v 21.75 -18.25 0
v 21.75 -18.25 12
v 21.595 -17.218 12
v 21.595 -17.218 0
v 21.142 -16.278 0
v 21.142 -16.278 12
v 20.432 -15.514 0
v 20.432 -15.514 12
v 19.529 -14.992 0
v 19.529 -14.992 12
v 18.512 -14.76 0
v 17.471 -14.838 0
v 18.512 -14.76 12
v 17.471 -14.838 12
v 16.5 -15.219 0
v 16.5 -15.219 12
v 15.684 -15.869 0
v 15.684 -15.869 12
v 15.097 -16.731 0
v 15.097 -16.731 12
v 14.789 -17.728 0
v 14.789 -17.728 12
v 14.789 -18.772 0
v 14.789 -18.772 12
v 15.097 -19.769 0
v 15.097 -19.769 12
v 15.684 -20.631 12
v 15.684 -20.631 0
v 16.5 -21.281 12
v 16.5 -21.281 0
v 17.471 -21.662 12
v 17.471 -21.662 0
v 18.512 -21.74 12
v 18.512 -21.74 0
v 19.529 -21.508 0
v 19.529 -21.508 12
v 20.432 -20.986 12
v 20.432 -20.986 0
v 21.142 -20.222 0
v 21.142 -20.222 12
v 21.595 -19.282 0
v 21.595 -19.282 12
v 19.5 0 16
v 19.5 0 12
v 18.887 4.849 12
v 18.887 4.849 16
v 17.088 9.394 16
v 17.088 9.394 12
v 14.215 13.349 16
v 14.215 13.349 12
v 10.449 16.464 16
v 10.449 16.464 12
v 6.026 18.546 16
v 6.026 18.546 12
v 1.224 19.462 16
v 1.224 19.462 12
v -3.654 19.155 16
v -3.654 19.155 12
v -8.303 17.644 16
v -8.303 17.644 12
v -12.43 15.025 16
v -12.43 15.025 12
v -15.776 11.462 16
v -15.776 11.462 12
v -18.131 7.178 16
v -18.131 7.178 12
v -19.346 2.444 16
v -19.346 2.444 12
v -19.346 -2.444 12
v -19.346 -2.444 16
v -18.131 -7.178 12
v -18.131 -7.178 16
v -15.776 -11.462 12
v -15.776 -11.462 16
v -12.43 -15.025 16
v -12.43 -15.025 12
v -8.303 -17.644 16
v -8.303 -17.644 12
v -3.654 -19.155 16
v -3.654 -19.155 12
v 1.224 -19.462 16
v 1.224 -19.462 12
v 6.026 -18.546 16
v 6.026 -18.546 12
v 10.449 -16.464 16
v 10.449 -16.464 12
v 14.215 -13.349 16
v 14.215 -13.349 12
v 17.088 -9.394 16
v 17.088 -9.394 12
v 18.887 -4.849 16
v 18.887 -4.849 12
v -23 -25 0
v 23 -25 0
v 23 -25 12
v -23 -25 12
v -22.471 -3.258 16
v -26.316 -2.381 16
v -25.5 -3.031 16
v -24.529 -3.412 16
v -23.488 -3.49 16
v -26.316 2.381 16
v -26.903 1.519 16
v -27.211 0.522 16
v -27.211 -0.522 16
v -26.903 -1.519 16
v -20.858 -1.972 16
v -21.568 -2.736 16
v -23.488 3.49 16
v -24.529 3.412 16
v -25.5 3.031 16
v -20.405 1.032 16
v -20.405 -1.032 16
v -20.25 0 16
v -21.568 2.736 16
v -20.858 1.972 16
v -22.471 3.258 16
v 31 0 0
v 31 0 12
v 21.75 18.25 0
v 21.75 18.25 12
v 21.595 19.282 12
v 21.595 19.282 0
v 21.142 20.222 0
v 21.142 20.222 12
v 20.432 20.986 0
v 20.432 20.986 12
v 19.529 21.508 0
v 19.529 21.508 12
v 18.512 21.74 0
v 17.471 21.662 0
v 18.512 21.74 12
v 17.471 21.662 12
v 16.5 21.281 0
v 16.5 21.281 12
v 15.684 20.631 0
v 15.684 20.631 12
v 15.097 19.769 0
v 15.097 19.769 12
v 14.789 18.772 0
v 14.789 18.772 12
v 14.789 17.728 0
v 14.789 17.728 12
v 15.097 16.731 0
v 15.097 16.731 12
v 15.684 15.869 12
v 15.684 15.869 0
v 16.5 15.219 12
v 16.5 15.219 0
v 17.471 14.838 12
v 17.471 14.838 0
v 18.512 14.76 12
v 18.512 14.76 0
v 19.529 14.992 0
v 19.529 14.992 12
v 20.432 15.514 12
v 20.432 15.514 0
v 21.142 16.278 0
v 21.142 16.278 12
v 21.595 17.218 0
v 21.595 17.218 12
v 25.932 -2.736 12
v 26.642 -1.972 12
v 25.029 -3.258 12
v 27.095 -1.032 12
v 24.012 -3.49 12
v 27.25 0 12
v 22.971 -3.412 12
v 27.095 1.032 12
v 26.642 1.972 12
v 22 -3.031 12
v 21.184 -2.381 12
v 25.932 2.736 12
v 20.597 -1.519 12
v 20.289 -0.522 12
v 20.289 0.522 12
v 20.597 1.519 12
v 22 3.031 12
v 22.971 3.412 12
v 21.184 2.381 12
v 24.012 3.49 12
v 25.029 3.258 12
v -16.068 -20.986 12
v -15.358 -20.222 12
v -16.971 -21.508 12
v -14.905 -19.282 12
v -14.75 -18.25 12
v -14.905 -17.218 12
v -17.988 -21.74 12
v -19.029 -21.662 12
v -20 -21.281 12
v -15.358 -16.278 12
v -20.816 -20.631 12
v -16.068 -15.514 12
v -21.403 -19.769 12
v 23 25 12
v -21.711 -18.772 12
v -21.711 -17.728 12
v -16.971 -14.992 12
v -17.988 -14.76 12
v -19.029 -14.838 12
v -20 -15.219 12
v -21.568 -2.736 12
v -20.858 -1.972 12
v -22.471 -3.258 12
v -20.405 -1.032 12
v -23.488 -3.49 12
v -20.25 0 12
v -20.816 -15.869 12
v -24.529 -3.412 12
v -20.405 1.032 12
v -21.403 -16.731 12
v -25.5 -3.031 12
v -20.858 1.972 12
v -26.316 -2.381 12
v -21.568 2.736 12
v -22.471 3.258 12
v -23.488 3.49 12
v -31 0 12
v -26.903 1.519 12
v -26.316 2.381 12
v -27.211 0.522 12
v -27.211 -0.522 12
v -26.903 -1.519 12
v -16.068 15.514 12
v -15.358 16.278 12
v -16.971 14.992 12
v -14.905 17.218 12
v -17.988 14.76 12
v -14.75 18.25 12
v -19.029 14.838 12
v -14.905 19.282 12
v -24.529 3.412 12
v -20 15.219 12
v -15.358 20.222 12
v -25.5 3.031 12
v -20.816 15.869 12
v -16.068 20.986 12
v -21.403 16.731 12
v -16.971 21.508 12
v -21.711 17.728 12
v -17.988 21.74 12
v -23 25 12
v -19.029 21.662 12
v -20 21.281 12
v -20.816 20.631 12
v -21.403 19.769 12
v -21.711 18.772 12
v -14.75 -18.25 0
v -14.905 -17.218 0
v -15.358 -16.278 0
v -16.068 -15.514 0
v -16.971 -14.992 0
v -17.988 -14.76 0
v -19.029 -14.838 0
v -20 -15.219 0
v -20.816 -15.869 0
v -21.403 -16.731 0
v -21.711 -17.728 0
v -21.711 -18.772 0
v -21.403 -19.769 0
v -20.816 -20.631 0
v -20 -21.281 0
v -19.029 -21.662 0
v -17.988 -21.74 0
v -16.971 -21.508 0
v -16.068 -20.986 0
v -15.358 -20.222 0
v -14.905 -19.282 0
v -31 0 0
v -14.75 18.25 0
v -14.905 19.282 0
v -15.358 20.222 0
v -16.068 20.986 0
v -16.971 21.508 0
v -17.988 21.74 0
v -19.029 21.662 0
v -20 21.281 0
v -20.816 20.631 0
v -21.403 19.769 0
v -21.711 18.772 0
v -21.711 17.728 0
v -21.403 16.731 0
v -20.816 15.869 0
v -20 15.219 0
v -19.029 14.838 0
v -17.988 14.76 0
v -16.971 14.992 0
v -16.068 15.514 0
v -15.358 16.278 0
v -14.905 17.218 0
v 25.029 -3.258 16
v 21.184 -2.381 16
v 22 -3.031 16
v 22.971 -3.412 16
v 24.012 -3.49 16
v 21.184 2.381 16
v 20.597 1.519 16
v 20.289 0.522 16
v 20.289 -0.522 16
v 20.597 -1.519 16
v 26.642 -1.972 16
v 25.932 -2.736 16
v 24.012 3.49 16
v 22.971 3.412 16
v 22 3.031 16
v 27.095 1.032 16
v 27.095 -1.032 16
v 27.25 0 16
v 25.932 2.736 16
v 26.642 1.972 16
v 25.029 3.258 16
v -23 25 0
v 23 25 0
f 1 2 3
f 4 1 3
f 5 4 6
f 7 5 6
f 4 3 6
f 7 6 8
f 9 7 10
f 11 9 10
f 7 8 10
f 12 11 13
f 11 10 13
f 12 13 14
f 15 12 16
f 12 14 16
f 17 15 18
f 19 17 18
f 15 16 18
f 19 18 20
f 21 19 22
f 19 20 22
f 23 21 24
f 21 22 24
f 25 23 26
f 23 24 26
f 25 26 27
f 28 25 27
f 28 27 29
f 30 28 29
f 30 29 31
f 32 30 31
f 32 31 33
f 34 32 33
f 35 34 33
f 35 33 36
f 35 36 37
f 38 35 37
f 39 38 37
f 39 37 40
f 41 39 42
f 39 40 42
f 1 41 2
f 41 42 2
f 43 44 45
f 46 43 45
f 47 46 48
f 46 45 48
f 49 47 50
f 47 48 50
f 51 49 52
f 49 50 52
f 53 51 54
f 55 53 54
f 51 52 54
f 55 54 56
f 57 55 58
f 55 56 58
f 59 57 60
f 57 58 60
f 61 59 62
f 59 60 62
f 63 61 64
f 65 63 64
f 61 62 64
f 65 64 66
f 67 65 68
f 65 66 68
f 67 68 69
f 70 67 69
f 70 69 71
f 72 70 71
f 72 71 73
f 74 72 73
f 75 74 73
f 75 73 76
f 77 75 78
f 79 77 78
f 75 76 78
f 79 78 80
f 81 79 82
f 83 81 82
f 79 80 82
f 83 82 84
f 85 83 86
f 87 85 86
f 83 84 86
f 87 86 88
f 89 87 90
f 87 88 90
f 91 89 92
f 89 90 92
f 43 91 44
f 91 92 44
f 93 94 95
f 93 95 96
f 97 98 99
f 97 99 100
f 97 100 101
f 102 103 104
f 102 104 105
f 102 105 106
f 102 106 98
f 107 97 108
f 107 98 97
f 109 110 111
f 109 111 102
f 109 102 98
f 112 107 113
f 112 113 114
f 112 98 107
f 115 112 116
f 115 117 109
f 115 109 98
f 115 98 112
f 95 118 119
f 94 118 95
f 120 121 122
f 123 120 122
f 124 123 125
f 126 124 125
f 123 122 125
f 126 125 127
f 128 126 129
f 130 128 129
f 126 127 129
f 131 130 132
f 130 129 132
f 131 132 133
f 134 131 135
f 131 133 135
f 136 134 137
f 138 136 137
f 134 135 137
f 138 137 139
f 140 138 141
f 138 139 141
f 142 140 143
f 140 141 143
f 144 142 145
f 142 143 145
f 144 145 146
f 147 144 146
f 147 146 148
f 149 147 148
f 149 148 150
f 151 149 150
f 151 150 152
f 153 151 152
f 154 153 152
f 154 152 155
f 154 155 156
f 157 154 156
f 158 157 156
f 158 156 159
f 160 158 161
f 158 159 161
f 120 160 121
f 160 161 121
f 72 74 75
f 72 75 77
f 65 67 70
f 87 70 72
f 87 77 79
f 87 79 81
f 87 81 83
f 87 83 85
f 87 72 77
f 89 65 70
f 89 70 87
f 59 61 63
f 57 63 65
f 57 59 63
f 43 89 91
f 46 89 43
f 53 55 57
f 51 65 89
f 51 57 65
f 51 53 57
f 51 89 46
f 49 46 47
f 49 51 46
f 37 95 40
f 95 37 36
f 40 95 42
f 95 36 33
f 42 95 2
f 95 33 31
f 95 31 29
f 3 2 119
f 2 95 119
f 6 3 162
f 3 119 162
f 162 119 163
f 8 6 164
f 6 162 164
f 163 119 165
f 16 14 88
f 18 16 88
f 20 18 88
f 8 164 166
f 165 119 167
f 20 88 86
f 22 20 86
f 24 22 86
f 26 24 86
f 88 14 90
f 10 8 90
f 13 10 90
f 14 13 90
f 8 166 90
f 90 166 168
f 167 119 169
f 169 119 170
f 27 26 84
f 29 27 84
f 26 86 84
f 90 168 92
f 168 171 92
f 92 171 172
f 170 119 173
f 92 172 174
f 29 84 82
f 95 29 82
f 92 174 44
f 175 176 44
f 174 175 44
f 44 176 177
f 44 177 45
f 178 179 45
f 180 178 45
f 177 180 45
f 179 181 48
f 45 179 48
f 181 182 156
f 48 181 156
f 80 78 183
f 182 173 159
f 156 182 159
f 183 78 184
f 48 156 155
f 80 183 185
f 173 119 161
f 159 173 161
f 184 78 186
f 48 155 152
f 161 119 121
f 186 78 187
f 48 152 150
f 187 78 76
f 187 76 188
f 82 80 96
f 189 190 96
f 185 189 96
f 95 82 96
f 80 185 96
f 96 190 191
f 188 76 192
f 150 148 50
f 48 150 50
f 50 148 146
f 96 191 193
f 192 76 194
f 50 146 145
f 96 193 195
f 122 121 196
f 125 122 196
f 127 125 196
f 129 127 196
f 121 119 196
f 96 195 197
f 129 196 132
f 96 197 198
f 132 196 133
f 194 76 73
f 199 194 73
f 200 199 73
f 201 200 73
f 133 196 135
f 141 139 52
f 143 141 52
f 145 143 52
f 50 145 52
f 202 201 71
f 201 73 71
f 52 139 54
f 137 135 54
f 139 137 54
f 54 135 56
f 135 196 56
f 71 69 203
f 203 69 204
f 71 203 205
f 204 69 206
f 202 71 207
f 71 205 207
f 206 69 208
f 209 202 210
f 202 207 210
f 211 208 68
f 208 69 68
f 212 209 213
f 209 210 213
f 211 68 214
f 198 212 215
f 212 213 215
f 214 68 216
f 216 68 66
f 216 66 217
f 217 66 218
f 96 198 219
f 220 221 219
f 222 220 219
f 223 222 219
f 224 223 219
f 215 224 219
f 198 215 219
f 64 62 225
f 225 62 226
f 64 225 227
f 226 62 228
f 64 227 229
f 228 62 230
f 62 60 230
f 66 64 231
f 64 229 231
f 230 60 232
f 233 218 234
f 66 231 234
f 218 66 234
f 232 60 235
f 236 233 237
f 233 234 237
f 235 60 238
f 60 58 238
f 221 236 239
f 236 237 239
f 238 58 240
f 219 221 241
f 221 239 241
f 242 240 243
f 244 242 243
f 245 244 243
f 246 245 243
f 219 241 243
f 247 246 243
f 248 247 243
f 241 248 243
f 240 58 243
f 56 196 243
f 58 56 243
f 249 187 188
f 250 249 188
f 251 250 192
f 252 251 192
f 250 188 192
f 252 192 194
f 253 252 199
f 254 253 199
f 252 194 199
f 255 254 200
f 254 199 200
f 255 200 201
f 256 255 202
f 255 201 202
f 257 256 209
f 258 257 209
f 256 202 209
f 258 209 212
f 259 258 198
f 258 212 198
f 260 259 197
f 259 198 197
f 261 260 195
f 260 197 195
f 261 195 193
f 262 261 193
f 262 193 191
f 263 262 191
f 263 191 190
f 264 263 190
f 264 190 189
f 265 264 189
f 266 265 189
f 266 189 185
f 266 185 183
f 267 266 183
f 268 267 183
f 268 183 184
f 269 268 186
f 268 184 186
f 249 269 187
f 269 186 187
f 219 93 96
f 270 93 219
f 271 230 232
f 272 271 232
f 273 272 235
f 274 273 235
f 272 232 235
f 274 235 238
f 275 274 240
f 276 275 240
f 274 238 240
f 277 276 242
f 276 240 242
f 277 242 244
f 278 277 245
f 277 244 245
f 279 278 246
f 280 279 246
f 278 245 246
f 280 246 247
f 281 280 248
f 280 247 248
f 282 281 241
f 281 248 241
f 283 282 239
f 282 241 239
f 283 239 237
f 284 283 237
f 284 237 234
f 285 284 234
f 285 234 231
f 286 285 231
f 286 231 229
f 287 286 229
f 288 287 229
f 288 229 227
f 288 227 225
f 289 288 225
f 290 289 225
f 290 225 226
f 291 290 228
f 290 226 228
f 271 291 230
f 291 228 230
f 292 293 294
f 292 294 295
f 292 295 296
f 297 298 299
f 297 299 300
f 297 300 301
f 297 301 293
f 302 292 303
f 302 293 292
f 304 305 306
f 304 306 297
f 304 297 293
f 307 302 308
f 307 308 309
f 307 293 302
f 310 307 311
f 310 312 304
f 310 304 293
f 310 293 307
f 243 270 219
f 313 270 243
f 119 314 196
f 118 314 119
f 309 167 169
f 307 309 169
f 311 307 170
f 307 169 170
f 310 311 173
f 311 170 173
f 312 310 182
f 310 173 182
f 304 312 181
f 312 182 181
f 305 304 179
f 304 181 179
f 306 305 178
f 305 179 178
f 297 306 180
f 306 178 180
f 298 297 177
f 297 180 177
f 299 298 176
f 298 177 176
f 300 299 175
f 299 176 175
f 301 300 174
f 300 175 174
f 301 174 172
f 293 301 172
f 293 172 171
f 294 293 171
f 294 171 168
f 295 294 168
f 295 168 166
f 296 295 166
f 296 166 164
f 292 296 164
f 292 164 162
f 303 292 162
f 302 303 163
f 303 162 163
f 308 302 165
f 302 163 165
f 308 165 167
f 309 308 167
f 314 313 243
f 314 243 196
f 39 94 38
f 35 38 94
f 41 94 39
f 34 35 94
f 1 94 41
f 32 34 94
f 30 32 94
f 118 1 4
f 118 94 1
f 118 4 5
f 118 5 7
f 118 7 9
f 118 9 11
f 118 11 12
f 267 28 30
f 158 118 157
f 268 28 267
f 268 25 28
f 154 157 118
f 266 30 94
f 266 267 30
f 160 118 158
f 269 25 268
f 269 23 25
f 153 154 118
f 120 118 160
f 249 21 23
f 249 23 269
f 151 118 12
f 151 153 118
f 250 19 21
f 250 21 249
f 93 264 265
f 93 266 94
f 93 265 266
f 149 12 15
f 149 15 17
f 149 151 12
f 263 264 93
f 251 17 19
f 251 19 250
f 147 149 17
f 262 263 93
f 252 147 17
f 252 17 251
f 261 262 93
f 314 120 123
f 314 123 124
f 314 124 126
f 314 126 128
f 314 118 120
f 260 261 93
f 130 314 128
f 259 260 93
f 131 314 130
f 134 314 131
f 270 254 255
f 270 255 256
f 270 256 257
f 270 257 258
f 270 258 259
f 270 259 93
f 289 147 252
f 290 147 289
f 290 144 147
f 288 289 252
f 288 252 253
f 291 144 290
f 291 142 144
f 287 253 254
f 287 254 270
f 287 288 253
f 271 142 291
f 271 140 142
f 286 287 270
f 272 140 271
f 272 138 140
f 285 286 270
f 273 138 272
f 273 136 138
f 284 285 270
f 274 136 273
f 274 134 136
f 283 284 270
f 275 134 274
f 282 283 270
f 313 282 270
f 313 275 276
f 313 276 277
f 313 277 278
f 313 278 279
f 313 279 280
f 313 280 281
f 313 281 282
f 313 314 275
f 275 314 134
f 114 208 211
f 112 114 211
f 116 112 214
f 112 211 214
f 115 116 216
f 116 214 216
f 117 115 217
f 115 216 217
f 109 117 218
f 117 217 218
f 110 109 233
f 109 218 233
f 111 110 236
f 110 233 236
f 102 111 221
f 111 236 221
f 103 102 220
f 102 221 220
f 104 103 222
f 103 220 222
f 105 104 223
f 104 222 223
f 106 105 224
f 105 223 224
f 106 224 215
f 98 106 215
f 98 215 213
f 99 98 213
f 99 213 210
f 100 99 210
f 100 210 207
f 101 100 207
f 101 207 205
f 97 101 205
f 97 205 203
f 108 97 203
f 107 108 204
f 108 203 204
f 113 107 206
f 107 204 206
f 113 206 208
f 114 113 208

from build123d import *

# Parameters (mm, degrees)
BOSS_EXTRUDE1_DEPTH = 12
SKETCH2_R           = 19.5
SKETCH2_R_2         = 3.5
BOSS_EXTRUDE2_DEPTH = 4
SKETCH3_R           = 3.5
CUT_EXTRUDE1_DEPTH  = 12


with BuildPart() as part:
    # Sketch1 → Boss-Extrude1 (new body)
    with BuildSketch(Plane.XY):
        Polygon((-23, 25), (23, 25), (31, 0), (23, -25), (-23, -25), (-31, 0), align=None)
    extrude(amount=BOSS_EXTRUDE1_DEPTH)

    # Sketch2 → Boss-Extrude2 (add)
    with BuildSketch(Plane.XY.offset(12)):
        Circle(SKETCH2_R)
        with Locations((23.75, 0)):
            Circle(SKETCH2_R_2)
        with Locations((-23.75, 0)):
            Circle(SKETCH2_R_2)
    extrude(amount=BOSS_EXTRUDE2_DEPTH)

    # Sketch3 → Cut-Extrude1 (cut)
    with BuildSketch(Plane.XY.offset(12)):
        with Locations((18.25, 18.25)):
            Circle(SKETCH3_R)
        with Locations((18.25, -18.25)):
            Circle(SKETCH3_R)
        with Locations((-18.25, -18.25)):
            Circle(SKETCH3_R)
        with Locations((-18.25, 18.25)):
            Circle(SKETCH3_R)
    extrude(amount=-CUT_EXTRUDE1_DEPTH, mode=Mode.SUBTRACT)


solid = part.part
